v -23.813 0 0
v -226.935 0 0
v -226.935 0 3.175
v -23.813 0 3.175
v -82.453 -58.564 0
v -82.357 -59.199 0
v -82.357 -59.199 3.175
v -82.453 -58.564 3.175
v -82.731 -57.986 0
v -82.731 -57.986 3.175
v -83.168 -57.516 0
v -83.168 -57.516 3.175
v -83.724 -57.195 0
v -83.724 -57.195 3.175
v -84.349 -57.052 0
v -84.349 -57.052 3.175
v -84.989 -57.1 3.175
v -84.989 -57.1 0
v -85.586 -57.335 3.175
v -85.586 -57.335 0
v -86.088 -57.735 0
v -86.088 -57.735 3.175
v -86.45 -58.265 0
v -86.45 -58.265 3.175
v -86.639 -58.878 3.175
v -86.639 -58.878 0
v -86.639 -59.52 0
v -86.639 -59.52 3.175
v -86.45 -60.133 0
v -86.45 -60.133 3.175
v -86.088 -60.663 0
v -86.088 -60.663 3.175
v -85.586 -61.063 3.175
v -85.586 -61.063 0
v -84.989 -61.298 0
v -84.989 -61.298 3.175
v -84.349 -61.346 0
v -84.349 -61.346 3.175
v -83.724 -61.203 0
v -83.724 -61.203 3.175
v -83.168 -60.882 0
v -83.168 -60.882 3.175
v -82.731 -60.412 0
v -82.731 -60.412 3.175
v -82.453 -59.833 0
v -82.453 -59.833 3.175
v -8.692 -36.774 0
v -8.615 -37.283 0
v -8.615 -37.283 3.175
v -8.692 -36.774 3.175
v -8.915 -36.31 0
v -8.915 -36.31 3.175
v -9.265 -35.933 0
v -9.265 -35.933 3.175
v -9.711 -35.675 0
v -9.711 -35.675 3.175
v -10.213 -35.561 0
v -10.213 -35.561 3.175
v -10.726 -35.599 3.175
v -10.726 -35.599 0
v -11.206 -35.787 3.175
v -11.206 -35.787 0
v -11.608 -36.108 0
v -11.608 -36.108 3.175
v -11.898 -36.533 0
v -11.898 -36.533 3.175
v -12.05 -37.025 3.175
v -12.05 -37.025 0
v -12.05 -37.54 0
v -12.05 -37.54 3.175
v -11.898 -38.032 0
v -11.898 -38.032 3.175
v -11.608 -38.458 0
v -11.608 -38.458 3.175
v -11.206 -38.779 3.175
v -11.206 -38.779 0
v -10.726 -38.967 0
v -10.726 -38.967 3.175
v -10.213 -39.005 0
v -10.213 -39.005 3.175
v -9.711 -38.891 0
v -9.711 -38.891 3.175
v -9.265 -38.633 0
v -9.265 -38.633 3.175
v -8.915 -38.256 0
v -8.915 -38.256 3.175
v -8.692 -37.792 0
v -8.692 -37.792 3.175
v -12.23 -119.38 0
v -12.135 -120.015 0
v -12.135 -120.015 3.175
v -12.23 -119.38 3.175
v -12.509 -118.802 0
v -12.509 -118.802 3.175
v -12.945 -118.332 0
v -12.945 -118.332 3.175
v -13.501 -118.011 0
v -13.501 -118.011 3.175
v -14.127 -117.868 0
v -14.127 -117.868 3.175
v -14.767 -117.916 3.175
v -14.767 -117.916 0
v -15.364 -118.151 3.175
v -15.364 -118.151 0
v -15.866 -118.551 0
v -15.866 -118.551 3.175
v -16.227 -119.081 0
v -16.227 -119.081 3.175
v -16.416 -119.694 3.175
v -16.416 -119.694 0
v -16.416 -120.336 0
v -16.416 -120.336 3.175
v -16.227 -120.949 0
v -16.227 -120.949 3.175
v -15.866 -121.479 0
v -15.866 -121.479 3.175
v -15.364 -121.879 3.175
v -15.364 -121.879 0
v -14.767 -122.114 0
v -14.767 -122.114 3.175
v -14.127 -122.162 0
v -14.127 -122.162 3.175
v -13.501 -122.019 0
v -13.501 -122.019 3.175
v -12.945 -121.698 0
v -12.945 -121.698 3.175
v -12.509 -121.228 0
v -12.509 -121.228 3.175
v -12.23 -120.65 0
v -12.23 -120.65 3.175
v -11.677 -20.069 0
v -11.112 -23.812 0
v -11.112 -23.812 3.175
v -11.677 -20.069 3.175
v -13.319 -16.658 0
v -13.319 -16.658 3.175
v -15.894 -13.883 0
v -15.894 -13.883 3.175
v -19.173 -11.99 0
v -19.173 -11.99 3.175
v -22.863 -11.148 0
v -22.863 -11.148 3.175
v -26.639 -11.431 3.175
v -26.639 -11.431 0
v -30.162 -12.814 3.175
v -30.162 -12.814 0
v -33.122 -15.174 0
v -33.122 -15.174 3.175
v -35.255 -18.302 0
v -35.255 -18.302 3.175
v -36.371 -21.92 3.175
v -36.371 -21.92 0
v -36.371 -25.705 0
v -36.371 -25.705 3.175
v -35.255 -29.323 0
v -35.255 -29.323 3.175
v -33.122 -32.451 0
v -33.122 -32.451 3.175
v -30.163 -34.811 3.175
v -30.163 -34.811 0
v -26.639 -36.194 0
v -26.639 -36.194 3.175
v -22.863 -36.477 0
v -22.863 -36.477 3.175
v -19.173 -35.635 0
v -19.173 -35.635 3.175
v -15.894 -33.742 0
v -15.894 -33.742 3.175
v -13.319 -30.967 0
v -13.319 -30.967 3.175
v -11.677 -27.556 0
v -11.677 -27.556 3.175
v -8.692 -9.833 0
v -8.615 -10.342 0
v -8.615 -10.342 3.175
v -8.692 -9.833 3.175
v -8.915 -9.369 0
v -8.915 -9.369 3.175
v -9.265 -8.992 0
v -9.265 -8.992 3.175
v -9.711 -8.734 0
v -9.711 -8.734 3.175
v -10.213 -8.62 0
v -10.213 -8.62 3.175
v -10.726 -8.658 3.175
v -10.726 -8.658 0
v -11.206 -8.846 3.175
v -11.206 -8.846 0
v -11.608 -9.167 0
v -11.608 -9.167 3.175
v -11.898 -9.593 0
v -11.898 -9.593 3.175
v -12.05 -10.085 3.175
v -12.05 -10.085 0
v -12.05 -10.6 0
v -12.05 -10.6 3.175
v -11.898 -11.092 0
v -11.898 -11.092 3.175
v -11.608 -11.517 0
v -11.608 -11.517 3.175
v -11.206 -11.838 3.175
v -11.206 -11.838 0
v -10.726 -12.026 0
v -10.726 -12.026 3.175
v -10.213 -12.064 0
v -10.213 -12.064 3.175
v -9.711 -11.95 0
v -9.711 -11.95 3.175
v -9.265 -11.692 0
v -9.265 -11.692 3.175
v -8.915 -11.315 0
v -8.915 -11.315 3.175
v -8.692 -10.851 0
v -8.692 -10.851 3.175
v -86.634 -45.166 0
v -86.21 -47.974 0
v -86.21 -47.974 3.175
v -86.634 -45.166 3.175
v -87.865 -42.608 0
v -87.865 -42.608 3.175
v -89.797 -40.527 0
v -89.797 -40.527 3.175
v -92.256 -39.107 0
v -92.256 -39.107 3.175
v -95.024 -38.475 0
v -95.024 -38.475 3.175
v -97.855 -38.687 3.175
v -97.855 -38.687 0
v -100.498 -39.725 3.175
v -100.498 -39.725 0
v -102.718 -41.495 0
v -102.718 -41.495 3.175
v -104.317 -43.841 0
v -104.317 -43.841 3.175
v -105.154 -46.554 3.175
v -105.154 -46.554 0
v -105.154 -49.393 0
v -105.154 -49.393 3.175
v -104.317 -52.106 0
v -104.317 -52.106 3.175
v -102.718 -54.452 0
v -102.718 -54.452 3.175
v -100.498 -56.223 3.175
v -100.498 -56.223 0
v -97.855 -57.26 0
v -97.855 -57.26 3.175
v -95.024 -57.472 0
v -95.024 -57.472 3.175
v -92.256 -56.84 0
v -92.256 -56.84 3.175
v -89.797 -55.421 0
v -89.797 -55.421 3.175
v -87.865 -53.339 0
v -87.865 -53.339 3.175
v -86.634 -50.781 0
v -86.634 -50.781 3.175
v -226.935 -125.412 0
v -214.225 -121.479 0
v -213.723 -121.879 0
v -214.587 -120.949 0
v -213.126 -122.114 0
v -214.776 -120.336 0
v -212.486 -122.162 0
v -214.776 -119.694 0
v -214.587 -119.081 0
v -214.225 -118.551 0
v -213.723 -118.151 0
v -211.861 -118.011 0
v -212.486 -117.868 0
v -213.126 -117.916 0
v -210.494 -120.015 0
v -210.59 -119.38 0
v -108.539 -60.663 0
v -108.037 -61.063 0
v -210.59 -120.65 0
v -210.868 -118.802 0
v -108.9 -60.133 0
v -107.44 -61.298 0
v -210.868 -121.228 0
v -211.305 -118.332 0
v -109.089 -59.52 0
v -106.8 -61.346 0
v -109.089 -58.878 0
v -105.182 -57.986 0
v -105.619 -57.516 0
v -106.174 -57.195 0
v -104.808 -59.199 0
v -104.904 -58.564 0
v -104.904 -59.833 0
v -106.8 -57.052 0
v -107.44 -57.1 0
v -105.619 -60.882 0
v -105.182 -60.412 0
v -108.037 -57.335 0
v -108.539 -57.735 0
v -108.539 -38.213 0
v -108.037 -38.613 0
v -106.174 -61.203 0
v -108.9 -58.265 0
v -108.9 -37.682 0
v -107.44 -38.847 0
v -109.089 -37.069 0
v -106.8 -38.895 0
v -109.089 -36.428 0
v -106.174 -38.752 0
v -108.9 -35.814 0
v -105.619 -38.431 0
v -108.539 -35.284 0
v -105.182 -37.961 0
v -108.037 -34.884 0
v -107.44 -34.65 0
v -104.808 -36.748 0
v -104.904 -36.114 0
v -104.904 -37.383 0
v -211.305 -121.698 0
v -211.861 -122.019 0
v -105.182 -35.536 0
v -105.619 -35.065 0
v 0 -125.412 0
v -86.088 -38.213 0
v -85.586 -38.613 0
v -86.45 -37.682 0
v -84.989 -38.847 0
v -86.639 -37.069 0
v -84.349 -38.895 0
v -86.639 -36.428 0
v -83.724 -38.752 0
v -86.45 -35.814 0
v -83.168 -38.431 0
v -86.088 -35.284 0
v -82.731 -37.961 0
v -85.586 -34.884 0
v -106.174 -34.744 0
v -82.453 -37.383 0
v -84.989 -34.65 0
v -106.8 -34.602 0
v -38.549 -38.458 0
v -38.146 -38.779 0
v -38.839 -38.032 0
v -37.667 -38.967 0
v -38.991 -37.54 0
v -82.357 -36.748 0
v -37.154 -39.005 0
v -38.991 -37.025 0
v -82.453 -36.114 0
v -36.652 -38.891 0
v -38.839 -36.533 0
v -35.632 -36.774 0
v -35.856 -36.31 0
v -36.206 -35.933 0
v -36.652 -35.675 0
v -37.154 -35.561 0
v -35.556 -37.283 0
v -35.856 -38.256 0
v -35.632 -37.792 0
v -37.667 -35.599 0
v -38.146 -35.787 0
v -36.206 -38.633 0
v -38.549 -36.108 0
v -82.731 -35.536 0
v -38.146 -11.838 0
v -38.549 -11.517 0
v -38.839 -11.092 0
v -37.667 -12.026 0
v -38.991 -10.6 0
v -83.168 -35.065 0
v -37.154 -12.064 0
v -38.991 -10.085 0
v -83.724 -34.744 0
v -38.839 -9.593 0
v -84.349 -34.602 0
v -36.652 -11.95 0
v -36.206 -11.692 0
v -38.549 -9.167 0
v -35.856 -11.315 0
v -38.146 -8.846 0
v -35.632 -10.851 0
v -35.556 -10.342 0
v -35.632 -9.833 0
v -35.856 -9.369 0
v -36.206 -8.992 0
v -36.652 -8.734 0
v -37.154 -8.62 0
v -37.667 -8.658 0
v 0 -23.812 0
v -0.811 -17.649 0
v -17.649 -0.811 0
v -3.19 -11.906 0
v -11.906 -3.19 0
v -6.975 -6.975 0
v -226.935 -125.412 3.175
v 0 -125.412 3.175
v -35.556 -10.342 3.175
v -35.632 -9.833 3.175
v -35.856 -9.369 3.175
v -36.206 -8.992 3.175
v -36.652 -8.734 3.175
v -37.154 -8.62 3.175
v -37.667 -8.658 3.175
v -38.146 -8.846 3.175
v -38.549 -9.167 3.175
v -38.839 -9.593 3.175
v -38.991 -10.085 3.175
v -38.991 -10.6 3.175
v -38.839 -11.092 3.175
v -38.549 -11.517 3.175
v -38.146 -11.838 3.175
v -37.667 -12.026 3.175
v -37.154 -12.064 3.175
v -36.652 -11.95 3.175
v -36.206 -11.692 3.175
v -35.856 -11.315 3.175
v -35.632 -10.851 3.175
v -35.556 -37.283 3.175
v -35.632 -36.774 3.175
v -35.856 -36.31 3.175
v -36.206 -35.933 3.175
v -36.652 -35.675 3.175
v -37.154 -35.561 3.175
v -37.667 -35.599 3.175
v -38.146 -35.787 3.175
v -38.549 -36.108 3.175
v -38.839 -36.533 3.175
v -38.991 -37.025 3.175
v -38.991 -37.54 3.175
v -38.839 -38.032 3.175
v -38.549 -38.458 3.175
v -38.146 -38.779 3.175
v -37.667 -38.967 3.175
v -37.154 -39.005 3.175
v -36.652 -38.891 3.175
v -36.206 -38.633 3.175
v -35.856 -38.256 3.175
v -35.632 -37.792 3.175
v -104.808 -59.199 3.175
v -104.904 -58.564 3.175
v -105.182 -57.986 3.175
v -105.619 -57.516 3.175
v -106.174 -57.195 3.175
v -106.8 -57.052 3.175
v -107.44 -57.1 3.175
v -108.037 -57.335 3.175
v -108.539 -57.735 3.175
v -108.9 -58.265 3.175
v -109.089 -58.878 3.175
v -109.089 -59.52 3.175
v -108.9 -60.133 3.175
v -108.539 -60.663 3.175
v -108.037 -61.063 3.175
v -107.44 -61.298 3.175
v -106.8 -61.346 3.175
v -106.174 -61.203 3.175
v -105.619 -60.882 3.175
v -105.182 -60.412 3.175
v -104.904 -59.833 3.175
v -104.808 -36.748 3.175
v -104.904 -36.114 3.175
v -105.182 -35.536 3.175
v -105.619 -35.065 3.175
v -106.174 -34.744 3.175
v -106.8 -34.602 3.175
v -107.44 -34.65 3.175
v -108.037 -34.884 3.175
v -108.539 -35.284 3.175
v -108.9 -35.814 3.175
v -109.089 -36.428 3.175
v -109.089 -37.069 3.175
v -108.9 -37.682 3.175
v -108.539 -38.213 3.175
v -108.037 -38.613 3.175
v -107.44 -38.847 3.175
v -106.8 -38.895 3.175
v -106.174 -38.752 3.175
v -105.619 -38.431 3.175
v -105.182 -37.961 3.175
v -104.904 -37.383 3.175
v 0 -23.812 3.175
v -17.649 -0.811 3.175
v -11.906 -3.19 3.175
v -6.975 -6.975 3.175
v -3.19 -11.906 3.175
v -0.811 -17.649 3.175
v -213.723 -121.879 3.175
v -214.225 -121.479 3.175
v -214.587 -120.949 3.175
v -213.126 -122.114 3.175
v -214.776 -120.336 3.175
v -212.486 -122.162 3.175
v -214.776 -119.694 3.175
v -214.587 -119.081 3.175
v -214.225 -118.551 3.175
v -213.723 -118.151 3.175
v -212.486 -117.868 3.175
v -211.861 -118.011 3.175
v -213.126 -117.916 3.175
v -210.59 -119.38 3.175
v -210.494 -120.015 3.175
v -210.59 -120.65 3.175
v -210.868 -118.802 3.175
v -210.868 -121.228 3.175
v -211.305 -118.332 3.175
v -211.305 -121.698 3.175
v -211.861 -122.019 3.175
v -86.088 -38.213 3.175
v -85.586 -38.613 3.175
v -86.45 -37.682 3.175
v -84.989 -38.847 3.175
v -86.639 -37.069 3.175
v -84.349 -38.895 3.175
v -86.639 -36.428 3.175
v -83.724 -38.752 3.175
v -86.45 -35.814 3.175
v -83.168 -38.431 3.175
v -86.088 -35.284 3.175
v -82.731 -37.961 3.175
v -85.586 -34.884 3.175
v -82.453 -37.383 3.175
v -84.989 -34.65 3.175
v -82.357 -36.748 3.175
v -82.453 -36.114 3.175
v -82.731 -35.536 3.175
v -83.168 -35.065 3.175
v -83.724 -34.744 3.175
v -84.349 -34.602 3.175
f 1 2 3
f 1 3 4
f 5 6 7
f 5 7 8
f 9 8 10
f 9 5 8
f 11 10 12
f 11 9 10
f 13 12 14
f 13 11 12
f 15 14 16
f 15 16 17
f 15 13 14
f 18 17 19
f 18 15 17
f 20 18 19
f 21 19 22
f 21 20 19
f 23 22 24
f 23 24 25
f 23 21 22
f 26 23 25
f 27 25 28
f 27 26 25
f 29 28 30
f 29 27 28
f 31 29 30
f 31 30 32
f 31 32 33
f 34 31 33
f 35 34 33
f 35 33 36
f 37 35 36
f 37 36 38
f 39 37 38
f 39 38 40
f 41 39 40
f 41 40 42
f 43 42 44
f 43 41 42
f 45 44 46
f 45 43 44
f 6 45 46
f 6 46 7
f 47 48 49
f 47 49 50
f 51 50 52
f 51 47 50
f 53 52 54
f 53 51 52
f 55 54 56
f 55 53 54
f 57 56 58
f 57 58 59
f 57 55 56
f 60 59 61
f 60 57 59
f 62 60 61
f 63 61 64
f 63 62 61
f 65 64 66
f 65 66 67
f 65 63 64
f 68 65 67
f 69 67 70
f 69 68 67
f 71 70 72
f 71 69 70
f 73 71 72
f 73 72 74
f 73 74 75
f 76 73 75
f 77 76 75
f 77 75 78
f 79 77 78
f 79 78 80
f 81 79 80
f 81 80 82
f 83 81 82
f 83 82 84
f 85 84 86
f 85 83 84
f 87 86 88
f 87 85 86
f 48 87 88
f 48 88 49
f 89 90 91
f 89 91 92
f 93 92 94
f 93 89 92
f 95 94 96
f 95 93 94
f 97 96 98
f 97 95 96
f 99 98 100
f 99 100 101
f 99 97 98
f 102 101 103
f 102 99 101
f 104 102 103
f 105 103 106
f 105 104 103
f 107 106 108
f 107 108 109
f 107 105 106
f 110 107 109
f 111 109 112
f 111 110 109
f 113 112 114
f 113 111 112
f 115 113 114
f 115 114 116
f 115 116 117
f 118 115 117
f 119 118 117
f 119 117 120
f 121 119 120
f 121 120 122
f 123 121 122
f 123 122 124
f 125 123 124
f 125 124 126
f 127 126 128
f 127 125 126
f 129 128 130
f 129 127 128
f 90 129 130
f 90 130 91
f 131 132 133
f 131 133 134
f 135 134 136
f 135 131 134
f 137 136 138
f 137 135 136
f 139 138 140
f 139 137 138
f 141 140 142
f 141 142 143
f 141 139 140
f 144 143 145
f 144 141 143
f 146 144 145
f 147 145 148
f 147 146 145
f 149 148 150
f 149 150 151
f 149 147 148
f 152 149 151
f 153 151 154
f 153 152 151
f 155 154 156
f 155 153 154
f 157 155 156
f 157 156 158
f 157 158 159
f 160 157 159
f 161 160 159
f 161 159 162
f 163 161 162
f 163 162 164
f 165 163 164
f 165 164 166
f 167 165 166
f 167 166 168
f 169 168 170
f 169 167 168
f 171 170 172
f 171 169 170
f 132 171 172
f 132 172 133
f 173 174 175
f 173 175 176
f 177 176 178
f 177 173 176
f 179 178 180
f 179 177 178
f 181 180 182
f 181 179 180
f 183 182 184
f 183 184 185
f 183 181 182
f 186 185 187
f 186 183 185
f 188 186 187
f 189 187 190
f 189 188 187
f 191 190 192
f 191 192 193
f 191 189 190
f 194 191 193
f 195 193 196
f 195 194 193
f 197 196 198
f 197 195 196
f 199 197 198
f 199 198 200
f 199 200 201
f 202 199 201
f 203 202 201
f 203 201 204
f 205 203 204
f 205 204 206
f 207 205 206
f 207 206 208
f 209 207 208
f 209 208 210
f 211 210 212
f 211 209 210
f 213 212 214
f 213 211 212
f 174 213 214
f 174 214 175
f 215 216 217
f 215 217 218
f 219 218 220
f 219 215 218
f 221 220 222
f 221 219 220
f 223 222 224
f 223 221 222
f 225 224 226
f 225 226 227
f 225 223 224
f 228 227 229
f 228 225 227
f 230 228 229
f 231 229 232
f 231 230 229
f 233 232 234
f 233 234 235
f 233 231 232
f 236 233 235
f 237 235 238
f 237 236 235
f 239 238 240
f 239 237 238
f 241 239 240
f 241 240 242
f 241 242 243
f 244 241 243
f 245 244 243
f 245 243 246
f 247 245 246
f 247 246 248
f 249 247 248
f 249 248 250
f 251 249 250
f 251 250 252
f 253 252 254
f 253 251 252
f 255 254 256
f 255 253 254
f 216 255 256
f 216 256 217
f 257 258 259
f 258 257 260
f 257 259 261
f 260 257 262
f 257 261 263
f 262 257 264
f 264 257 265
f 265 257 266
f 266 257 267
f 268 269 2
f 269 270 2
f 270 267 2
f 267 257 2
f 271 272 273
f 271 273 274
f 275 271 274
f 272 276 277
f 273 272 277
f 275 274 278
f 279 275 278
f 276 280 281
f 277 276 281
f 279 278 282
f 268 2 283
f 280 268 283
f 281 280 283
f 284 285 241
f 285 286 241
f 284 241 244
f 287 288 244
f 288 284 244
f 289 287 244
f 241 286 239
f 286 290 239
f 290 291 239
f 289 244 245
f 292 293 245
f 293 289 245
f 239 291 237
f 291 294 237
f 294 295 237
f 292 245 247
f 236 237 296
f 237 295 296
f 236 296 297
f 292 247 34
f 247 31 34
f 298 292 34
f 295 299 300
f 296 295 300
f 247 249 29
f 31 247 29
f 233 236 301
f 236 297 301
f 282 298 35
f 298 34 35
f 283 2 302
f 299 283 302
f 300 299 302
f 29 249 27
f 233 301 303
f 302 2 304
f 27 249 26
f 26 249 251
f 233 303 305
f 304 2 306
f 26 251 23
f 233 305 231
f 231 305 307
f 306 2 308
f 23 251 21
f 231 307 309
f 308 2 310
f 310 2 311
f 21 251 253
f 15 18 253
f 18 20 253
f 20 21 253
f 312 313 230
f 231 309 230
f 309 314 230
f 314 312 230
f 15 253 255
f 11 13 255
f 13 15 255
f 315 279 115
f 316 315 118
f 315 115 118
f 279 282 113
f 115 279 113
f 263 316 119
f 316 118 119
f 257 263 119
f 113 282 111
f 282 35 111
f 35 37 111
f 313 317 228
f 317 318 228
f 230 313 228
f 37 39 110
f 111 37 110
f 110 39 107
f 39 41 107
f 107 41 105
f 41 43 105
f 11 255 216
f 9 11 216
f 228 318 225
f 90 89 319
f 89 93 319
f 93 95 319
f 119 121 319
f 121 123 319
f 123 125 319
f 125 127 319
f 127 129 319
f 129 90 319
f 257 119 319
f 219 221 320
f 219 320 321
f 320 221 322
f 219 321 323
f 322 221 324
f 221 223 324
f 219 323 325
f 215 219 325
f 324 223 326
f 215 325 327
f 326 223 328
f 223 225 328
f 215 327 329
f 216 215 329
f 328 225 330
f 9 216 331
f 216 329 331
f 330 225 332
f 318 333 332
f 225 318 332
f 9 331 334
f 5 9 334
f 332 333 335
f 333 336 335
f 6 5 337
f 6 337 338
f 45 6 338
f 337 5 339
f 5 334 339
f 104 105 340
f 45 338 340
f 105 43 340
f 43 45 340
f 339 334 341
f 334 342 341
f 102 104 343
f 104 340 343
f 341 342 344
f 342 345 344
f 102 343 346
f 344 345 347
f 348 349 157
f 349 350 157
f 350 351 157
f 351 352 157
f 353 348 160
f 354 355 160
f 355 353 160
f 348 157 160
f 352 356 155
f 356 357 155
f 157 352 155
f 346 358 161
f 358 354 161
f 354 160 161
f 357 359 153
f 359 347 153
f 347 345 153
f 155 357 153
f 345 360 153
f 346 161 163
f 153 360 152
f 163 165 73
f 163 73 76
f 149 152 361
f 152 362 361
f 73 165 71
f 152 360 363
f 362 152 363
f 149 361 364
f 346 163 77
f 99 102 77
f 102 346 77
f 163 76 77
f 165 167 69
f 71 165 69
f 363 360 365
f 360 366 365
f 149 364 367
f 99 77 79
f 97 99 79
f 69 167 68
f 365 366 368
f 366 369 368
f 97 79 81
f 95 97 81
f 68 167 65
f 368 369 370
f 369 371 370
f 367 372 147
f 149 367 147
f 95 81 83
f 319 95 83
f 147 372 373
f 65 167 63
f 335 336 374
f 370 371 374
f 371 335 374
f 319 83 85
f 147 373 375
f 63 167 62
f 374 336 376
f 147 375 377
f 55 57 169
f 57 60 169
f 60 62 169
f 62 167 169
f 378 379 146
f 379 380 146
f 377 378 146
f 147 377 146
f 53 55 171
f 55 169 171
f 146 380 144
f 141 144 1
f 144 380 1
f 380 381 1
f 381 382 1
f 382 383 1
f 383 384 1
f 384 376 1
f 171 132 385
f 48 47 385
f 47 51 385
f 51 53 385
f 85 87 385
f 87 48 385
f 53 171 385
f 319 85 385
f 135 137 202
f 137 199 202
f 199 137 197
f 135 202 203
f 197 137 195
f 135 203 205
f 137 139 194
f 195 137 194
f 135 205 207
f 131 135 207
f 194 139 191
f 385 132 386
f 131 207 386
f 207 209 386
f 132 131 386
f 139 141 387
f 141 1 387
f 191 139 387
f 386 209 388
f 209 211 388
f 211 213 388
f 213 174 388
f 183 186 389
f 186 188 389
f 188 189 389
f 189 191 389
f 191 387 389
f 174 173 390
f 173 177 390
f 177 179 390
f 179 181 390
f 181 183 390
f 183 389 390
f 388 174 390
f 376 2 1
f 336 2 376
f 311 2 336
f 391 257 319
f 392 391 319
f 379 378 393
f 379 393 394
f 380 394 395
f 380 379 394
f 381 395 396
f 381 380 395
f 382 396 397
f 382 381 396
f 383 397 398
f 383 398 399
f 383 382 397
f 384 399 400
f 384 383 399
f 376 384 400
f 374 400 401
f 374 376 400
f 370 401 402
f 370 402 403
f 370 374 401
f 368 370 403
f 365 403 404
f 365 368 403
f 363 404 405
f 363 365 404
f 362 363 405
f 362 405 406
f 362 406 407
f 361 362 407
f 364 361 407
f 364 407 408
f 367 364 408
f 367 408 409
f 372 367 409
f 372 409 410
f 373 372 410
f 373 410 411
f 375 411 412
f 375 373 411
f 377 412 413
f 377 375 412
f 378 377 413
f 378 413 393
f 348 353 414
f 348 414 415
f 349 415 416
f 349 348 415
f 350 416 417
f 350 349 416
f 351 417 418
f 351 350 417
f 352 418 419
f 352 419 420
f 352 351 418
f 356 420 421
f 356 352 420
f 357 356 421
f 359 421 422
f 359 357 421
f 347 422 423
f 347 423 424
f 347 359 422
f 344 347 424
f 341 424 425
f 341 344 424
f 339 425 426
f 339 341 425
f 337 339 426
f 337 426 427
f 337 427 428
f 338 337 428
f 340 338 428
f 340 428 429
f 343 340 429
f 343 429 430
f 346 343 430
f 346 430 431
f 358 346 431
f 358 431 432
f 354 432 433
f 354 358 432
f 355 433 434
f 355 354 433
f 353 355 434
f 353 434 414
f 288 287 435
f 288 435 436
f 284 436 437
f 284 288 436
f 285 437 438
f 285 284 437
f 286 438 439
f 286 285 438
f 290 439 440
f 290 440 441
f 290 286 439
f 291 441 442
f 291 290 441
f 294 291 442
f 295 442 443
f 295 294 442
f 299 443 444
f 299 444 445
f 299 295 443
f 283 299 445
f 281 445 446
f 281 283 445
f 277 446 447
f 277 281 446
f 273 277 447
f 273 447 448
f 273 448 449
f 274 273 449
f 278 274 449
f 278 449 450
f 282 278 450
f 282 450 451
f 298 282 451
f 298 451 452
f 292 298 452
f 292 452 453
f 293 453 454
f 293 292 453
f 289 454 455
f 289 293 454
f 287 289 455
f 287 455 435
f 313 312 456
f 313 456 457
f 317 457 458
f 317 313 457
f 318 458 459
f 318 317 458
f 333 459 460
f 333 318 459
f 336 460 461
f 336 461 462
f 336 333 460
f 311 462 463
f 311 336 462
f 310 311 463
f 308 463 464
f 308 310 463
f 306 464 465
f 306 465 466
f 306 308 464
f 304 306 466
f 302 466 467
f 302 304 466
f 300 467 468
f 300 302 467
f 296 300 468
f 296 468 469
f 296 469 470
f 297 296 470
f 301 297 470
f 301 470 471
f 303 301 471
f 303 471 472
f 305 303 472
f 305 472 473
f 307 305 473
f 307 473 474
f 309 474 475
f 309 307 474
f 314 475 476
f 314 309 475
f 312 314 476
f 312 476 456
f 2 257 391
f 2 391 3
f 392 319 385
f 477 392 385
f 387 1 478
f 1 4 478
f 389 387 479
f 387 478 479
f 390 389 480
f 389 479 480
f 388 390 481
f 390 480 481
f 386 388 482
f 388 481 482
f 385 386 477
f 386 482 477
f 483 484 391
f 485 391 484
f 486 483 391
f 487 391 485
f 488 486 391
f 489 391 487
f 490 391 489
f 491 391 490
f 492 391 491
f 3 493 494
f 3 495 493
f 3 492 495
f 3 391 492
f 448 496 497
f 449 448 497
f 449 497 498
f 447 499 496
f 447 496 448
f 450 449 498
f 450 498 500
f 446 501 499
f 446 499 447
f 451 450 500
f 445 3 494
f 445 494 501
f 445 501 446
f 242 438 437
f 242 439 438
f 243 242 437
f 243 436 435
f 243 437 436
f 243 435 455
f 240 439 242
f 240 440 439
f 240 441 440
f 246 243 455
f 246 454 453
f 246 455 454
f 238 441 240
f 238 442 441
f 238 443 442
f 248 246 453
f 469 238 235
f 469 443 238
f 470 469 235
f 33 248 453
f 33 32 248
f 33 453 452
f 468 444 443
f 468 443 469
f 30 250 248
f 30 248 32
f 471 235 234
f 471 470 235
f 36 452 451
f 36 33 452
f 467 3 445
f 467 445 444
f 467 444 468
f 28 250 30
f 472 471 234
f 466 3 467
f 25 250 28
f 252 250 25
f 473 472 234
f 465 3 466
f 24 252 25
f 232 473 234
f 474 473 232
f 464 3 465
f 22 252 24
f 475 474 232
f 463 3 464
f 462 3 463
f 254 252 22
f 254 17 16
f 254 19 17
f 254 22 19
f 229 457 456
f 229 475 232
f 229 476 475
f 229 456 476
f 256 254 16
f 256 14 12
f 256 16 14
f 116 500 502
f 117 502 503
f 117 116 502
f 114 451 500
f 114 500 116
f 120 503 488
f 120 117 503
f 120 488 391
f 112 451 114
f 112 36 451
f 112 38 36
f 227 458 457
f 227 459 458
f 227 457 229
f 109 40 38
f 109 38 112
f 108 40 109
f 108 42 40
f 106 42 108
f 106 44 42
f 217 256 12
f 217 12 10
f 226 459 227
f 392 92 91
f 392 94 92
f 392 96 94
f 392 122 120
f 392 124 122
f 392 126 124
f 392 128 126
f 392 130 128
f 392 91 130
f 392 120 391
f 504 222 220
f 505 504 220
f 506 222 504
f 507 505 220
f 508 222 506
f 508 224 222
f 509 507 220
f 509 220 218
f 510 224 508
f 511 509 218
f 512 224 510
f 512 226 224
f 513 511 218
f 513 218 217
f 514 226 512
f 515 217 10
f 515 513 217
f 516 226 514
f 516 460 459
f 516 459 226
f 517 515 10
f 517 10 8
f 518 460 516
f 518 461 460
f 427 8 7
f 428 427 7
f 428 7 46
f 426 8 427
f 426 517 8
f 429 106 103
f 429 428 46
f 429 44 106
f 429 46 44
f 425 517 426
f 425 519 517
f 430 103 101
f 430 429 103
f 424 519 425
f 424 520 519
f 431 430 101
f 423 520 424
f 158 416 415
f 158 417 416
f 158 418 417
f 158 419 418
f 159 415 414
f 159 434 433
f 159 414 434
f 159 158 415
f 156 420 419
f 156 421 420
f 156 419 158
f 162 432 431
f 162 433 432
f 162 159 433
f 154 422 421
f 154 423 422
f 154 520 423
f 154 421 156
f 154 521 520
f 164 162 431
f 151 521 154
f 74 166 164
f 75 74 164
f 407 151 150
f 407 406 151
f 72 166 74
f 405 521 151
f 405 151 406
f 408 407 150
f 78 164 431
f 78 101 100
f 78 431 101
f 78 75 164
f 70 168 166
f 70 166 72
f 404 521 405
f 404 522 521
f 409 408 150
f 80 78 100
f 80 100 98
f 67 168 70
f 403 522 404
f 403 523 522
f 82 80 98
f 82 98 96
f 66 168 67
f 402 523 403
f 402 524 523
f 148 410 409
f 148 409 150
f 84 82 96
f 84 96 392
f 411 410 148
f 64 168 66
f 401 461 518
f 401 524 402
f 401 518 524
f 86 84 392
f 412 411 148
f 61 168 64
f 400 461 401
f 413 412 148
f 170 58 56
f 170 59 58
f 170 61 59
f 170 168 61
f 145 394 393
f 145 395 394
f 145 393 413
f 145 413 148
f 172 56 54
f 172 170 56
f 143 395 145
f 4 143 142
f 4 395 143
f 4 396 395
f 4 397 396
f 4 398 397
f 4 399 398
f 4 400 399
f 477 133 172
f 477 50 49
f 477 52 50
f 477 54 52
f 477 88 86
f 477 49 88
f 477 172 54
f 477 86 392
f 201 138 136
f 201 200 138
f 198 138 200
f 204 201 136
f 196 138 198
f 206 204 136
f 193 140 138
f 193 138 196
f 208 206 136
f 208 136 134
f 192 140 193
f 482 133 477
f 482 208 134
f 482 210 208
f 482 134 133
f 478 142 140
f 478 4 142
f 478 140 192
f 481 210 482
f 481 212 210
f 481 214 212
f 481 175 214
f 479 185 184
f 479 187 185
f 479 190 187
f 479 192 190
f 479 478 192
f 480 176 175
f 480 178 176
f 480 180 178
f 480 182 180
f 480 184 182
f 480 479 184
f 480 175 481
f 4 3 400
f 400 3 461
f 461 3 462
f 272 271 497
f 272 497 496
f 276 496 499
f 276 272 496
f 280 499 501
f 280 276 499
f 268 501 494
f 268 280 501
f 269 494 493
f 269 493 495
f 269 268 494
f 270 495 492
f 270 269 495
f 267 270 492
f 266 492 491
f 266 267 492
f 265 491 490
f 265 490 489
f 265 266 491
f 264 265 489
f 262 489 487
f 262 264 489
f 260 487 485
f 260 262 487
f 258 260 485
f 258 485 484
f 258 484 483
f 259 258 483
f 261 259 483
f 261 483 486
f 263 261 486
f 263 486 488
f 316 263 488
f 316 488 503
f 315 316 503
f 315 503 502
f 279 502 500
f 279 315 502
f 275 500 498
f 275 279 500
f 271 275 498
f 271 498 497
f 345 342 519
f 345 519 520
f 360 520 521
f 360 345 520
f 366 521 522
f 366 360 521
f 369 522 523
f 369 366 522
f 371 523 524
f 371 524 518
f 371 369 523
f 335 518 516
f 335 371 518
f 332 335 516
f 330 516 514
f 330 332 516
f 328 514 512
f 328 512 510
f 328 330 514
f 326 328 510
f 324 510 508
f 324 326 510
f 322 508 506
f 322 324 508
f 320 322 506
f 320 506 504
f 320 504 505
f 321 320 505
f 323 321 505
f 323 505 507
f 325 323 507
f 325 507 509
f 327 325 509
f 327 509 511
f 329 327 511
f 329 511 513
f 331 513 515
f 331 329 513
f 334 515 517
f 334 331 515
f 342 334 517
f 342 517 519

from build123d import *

# Parameters (mm, degrees)
F0_W     = 226.934583
F0_H     = 125.4125
F0_R     = 2.15265
F0_R_2   = 9.525
F0_R_3   = 1.7272
F0_R_4   = 12.7
F1_DEPTH = 3.175
F2_R     = 23.8125


with BuildPart() as f1:
    # F0 (on Top) → F1 (new body)
    with BuildSketch(Plane.XY):
        with Locations((-113.467292, -62.70625)):
            Rectangle(F0_W, F0_H)
        with Locations((-212.647083, -120.015)):
            Circle(F0_R, mode=Mode.SUBTRACT)
        with Locations((-14.2875, -120.015)):
            Circle(F0_R, mode=Mode.SUBTRACT)
        with Locations((-106.960737, -59.198979)):
            Circle(F0_R, mode=Mode.SUBTRACT)
        with Locations((-95.735416, -47.973659)):
            Circle(F0_R_2, mode=Mode.SUBTRACT)
        with Locations((-84.510096, -59.198979)):
            Circle(F0_R, mode=Mode.SUBTRACT)
        with Locations((-106.960737, -36.748339)):
            Circle(F0_R, mode=Mode.SUBTRACT)
        with Locations((-84.510096, -36.748339)):
            Circle(F0_R, mode=Mode.SUBTRACT)
        with Locations((-37.282884, -37.282884)):
            Circle(F0_R_3, mode=Mode.SUBTRACT)
        with Locations((-10.342116, -37.282884)):
            Circle(F0_R_3, mode=Mode.SUBTRACT)
        with Locations((-23.8125, -23.8125)):
            Circle(F0_R_4, mode=Mode.SUBTRACT)
        with Locations((-37.282884, -10.342116)):
            Circle(F0_R_3, mode=Mode.SUBTRACT)
        with Locations((-10.342116, -10.342116)):
            Circle(F0_R_3, mode=Mode.SUBTRACT)
    extrude(amount=F1_DEPTH)

    # F2
    f2_edges = [f1.edges().sort_by_distance(p)[0] for p in [
        (0, 0, 1.5875),
    ]]
    fillet(f2_edges, radius=F2_R)


solid = f1.part
